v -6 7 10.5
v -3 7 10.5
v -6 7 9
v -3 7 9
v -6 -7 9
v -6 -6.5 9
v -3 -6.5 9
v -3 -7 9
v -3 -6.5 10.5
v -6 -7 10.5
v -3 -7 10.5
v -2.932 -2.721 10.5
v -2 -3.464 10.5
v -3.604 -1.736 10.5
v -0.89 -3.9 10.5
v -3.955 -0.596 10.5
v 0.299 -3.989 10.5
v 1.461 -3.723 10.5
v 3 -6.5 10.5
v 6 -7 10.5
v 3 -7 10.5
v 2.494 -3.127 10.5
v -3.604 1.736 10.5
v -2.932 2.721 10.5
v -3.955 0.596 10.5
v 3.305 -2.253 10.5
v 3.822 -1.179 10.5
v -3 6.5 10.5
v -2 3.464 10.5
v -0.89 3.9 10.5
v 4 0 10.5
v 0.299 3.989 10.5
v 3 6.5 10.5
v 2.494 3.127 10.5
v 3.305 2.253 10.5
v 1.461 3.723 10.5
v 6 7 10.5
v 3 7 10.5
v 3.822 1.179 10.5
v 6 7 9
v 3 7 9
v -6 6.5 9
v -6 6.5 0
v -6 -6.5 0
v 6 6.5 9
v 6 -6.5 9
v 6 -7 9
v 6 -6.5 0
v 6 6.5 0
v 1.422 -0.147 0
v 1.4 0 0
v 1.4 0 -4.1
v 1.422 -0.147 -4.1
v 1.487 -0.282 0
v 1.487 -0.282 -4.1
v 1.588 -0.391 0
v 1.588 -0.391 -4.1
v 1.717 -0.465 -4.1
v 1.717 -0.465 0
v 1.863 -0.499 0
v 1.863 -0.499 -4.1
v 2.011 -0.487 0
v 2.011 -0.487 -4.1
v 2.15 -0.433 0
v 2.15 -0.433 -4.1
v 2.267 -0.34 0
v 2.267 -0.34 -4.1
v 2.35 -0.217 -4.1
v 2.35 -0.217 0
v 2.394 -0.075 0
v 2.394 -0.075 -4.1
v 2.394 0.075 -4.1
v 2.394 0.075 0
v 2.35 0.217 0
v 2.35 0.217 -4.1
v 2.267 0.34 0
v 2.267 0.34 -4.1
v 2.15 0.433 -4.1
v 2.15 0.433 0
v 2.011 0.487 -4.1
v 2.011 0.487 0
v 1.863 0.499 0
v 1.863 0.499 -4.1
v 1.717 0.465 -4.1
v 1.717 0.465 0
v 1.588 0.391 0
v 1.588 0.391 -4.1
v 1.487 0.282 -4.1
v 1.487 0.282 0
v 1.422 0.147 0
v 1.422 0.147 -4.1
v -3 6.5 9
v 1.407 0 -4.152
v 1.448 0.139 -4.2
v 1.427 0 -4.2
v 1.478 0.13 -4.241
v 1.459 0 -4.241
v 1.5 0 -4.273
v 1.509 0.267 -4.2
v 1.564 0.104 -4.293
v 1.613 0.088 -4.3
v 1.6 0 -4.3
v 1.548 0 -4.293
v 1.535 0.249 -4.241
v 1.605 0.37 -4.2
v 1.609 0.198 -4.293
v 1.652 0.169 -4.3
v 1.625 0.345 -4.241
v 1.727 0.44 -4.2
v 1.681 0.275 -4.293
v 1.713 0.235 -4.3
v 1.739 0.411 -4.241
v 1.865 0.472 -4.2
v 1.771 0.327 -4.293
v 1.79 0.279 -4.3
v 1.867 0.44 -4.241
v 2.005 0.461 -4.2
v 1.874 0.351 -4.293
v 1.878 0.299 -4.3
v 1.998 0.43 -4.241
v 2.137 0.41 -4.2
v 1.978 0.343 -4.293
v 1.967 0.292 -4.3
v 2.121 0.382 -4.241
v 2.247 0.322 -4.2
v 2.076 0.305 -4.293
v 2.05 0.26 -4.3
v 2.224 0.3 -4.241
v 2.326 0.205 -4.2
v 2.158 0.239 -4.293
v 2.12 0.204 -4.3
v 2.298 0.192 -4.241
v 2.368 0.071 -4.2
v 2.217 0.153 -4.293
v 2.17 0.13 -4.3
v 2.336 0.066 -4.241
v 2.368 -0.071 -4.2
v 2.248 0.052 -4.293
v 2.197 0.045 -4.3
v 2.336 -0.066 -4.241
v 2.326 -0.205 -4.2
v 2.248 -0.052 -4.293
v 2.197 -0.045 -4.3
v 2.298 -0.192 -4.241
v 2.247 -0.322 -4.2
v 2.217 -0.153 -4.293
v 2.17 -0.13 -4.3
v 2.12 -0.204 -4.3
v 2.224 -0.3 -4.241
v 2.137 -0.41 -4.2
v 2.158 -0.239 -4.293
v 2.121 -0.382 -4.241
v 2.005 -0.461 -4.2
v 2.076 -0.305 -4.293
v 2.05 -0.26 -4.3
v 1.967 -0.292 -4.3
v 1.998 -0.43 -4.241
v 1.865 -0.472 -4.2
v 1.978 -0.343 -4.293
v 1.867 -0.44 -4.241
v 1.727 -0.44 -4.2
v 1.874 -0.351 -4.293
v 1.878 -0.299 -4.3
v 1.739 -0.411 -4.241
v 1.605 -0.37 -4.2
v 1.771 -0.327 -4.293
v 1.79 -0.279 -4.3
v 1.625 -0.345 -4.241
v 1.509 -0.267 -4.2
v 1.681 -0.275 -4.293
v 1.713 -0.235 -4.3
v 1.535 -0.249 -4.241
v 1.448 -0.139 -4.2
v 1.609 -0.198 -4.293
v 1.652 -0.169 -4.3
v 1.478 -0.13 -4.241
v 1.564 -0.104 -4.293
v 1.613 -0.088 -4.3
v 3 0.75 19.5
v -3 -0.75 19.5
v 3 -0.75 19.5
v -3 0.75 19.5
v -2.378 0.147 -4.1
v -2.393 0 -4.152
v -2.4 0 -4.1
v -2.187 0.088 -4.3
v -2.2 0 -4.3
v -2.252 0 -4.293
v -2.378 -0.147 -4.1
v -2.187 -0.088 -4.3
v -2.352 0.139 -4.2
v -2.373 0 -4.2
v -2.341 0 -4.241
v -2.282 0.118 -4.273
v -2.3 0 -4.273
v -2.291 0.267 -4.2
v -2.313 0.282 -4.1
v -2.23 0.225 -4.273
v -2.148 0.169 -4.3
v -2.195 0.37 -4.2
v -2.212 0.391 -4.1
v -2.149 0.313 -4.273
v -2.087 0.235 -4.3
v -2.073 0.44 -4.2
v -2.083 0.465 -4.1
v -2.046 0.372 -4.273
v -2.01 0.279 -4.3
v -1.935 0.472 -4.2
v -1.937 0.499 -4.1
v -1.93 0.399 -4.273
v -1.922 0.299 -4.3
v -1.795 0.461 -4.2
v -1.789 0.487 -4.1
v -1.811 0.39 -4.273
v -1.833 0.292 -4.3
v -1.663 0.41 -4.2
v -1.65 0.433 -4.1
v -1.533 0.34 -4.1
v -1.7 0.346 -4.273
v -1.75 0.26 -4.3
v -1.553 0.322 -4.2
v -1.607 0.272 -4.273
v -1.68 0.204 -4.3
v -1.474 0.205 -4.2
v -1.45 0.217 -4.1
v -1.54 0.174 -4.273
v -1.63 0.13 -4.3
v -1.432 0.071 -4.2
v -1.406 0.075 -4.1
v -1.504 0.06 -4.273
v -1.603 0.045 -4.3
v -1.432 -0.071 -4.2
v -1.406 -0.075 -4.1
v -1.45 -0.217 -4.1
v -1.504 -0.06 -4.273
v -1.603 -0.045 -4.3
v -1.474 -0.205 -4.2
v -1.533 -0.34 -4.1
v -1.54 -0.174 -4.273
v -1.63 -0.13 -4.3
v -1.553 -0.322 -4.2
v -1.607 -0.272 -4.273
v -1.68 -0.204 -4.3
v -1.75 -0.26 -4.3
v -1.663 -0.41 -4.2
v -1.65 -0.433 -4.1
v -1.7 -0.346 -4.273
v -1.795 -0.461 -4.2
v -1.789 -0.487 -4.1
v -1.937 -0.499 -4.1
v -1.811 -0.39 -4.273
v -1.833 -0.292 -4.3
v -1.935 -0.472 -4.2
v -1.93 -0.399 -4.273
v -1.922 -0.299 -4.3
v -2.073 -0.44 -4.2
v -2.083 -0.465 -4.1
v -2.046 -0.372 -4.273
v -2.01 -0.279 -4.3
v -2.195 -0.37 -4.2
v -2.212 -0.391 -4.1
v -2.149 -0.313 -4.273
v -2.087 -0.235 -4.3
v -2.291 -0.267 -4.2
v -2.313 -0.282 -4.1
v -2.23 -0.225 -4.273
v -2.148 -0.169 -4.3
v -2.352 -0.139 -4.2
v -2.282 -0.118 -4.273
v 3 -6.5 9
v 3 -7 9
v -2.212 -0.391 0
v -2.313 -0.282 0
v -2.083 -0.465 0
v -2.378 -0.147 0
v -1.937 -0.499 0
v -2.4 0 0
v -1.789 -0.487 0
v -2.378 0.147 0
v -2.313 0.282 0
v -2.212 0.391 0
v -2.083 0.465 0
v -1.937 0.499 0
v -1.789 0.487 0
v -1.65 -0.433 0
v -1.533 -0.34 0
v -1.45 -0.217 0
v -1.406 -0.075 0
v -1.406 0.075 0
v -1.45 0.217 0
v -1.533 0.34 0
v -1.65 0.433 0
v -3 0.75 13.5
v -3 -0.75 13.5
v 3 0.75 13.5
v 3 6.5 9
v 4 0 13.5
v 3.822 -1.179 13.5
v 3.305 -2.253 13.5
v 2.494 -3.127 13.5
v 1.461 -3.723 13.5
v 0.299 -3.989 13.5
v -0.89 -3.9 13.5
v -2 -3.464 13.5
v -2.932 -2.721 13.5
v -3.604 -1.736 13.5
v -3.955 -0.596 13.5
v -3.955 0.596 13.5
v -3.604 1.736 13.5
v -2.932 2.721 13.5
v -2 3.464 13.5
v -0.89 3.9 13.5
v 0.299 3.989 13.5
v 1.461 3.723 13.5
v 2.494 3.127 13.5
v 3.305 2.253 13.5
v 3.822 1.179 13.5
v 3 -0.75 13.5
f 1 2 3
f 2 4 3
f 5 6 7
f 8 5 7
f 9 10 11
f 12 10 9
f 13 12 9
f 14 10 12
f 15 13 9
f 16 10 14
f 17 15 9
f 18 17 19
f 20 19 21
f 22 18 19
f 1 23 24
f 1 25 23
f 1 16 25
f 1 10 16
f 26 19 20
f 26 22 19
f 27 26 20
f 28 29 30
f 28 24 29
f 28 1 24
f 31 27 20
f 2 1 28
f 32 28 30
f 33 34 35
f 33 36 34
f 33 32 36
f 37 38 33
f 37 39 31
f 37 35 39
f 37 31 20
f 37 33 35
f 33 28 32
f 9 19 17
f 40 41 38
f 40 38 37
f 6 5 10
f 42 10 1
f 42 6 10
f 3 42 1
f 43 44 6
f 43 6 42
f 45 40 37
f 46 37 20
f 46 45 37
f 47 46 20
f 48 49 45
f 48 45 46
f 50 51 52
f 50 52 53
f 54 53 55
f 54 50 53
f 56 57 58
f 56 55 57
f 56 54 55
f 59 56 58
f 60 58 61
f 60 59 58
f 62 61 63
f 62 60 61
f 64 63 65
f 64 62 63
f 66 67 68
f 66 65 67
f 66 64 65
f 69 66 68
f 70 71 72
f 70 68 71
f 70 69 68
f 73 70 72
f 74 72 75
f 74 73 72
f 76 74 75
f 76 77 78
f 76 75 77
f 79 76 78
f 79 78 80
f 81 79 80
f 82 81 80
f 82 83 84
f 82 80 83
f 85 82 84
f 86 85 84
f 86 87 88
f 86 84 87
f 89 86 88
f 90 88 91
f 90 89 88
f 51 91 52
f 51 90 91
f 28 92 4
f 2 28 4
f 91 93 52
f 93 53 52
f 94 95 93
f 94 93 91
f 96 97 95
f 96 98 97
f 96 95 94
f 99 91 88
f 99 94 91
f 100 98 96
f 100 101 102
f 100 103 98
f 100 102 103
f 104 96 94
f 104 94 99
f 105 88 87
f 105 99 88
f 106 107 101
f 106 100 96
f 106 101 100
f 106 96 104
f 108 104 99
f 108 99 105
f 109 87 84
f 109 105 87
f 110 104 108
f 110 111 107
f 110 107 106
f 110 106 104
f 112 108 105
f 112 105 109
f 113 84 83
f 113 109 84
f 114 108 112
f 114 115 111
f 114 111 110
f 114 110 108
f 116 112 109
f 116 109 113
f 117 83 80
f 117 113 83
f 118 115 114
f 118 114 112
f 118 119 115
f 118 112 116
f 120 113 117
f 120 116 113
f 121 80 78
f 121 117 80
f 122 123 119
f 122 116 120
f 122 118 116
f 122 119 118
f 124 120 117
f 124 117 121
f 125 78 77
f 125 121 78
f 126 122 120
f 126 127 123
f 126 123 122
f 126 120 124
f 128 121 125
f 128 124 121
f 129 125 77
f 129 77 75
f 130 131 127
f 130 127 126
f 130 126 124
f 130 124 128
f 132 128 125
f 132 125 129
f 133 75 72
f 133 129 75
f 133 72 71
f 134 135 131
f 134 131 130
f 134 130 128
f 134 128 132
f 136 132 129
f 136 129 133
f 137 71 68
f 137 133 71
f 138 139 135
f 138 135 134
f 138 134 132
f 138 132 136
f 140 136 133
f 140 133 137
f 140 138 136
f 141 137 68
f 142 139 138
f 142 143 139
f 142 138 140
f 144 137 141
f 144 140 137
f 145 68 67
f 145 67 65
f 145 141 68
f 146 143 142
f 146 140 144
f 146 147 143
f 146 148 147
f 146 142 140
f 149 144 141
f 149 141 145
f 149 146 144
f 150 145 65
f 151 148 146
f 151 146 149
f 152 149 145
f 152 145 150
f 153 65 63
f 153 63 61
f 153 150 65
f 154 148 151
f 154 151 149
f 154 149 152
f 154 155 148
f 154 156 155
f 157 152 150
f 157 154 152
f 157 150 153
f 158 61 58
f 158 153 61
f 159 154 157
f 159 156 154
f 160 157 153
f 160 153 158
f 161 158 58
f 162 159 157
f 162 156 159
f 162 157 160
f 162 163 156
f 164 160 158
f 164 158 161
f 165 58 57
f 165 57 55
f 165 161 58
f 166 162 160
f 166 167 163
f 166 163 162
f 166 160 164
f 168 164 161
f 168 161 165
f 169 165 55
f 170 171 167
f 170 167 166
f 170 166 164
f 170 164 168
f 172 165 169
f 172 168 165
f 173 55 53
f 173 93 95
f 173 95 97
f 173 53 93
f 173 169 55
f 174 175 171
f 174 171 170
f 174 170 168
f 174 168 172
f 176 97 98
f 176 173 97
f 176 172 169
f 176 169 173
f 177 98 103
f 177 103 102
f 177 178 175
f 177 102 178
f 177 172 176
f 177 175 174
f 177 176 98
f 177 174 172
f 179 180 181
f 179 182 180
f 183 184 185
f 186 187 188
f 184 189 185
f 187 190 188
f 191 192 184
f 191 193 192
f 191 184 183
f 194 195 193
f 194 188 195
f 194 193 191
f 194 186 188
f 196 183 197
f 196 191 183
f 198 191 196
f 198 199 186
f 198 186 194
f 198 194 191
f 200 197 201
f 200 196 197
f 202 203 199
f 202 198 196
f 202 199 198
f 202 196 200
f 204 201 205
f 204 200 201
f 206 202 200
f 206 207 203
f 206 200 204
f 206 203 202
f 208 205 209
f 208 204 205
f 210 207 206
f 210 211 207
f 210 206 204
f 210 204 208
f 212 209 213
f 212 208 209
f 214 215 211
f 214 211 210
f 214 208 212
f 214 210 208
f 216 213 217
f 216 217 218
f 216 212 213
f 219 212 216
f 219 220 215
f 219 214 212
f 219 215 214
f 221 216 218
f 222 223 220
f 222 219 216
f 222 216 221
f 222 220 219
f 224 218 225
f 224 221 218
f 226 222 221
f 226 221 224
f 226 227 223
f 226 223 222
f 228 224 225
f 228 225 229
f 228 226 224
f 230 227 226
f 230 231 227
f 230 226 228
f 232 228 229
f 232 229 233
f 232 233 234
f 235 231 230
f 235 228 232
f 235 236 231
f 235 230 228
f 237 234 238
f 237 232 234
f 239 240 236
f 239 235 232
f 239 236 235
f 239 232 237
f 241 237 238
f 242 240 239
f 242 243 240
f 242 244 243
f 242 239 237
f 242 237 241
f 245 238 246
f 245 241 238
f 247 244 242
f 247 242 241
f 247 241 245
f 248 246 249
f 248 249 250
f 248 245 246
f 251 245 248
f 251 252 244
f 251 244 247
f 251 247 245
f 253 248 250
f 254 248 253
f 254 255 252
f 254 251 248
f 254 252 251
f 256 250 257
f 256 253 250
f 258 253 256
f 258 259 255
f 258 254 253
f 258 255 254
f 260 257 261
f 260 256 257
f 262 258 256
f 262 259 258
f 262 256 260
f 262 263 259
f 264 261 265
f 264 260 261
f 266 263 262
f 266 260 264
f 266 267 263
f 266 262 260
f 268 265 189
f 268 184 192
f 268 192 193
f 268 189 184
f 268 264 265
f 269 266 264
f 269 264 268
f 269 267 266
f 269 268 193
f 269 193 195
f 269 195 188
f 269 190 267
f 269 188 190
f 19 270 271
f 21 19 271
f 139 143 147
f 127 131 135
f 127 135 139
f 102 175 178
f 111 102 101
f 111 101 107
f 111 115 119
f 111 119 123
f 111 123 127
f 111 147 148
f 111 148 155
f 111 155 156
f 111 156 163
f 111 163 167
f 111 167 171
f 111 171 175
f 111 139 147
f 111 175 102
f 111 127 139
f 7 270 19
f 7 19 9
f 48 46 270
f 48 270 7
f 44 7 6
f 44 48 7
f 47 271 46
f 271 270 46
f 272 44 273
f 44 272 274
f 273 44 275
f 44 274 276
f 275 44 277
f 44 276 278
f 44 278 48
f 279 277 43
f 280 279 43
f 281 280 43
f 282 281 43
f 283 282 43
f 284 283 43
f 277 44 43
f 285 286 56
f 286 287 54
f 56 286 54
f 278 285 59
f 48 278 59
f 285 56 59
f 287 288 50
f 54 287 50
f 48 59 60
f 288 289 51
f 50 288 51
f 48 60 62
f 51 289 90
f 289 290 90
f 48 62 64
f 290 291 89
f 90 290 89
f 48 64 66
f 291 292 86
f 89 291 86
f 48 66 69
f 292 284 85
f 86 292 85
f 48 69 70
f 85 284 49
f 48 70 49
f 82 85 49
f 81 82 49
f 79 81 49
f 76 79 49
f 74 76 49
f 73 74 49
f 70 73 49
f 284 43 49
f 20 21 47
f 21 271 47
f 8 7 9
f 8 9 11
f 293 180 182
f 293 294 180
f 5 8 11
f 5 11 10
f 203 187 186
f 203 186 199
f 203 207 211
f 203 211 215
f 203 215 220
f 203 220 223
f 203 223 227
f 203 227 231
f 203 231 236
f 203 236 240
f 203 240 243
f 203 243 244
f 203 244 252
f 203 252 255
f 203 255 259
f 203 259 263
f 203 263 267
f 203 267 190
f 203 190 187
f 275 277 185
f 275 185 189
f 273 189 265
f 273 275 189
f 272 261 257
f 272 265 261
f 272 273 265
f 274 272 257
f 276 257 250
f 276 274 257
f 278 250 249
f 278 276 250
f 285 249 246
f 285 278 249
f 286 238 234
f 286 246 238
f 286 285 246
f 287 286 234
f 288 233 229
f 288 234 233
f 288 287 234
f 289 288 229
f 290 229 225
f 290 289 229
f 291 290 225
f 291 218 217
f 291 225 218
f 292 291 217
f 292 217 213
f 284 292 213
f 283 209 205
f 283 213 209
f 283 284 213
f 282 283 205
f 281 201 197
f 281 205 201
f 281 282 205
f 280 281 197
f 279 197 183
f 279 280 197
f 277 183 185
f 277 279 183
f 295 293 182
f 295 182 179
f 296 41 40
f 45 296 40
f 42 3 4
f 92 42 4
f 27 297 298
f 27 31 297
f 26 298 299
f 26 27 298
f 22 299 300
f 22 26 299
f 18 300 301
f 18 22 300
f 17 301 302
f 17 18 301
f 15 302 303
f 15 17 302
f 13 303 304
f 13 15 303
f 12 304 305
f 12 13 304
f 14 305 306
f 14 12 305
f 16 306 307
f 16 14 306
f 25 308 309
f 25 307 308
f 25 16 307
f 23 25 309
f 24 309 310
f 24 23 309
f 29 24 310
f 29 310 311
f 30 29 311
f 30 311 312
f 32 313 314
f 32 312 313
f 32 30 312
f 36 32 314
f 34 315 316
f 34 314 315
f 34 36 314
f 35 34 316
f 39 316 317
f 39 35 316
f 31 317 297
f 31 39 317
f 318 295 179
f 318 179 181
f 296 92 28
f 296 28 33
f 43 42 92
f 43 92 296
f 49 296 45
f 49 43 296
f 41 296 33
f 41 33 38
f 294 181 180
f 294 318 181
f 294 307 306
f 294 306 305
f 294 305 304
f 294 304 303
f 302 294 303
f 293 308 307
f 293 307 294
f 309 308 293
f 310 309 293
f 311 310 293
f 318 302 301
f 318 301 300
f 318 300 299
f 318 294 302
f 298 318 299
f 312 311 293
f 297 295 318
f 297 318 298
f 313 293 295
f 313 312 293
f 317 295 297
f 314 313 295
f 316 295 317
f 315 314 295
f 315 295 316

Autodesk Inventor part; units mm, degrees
ref_plane "YZ Plane" through (0, 0, 0) normal (1, 0, 0) x (0, 1, 0)
ref_plane "XZ Plane" through (0, 0, 0) normal (0, 1, 0) x (-1, 0, 0)
ref_plane "XY Plane" through (0, 0, 0) normal (0, 0, 1) x (1, 0, 0)
sketch "Sketch1" plane through (0, 0, 0) normal (0, 0, 1) x (1, 0, 0)
  line L0 (-6, 6.5) -> (6, 6.5)
  line L1 (6, 6.5) -> (6, -6.5)
  line L2 (6, -6.5) -> (-6, -6.5)
  line L3 (-6, -6.5) -> (-6, 6.5)
  line L4 (-6, 6.5) -> (6, -6.5) construction
  line L5 (6, 6.5) -> (-6, -6.5) construction
  point P0 (0, 0)
  dimension "d0" = 12
  dimension "d1" = 13
extrude "Extrusion1" add sketch "Sketch1" along normal blind 9
sketch "Sketch2" plane through (0, 0, 9) normal (0, 0, 1) x (1, 0, 0)
  line L0 (-6, -6.5) -> (6, -6.5) projected
  line L1 (6, -6.5) -> (6, 6.5) projected
  line L2 (6, 6.5) -> (-6, 6.5) projected
  line L3 (-6, 6.5) -> (-6, -6.5) projected
  line L4 (6, 6.5) -> (-6, 6.5) projected
  line L5 (-6, 6.5) -> (-3, 6.5)
  line L6 (-3, 6.5) -> (-3, 7)
  line L7 (-3, 7) -> (-6, 7)
  line L8 (-6, 7) -> (-6, 6.5)
  line L9 (6, 6.5) -> (3, 6.5)
  line L10 (3, 6.5) -> (3, 7)
  line L11 (3, 7) -> (6, 7)
  line L12 (6, 7) -> (6, 6.5)
  line L13 (-6, -6.5) -> (6, -6.5) projected
  line L14 (6, -6.5) -> (3, -6.5)
  line L15 (3, -6.5) -> (3, -7)
  line L16 (3, -7) -> (6, -7)
  line L17 (6, -7) -> (6, -6.5)
  line L18 (-6, -6.5) -> (-3, -6.5)
  line L19 (-3, -6.5) -> (-3, -7)
  line L20 (-3, -7) -> (-6, -7)
  line L21 (-6, -7) -> (-6, -6.5)
  point P0 (0, 0)
  dimension "d4" = 3
  dimension "d5" = 0.5
extrude "Extrusion2" add sketch "Sketch2" along normal blind 1.5
sketch "Sketch3" plane through (0, 0, 10.5) normal (0, 0, 1) x (1, 0, 0)
  circle A0 centre (0, 0) radius 4
  dimension "d8" = 8
extrude "Extrusion3" add sketch "Sketch3" along normal blind 3
sketch "Sketch4" plane through (0, 0, 13.5) normal (0, 0, 1) x (1, 0, 0)
  line L0 (-3, 0.75) -> (3, 0.75)
  line L1 (3, 0.75) -> (3, -0.75)
  line L2 (3, -0.75) -> (-3, -0.75)
  line L3 (-3, -0.75) -> (-3, 0.75)
  line L4 (-3, 0.75) -> (3, -0.75) construction
  line L5 (3, 0.75) -> (-3, -0.75) construction
  point P0 (0, 0)
  dimension "d11" = 6
  dimension "d12" = 1.5
extrude "Extrusion4" add sketch "Sketch4" along normal blind 6
sketch "Sketch5" plane through (0, 0, 0) normal (0, 0, -1) x (-1, 0, 0)
  circle A0 centre (-1.9, 0) radius 0.5
  circle A1 centre (1.9, 0) radius 0.5
  point P0 (0, 0)
  dimension "d15" = 1
  dimension "d16" = 1
  dimension "d17" = 1.9
  dimension "d18" = 1.9
  dimension "d19" = 3.8
extrude "Extrusion5" add sketch "Sketch5" along normal blind 4.3
fillet "Fillet1" radius 0.2 2 edges at (2.4, 0, -4.3) (-1.4, 0, -4.3)
equation "\"d18\" = d17"
properties part number "KeyboardSwitch" material "ABS Plastic"
